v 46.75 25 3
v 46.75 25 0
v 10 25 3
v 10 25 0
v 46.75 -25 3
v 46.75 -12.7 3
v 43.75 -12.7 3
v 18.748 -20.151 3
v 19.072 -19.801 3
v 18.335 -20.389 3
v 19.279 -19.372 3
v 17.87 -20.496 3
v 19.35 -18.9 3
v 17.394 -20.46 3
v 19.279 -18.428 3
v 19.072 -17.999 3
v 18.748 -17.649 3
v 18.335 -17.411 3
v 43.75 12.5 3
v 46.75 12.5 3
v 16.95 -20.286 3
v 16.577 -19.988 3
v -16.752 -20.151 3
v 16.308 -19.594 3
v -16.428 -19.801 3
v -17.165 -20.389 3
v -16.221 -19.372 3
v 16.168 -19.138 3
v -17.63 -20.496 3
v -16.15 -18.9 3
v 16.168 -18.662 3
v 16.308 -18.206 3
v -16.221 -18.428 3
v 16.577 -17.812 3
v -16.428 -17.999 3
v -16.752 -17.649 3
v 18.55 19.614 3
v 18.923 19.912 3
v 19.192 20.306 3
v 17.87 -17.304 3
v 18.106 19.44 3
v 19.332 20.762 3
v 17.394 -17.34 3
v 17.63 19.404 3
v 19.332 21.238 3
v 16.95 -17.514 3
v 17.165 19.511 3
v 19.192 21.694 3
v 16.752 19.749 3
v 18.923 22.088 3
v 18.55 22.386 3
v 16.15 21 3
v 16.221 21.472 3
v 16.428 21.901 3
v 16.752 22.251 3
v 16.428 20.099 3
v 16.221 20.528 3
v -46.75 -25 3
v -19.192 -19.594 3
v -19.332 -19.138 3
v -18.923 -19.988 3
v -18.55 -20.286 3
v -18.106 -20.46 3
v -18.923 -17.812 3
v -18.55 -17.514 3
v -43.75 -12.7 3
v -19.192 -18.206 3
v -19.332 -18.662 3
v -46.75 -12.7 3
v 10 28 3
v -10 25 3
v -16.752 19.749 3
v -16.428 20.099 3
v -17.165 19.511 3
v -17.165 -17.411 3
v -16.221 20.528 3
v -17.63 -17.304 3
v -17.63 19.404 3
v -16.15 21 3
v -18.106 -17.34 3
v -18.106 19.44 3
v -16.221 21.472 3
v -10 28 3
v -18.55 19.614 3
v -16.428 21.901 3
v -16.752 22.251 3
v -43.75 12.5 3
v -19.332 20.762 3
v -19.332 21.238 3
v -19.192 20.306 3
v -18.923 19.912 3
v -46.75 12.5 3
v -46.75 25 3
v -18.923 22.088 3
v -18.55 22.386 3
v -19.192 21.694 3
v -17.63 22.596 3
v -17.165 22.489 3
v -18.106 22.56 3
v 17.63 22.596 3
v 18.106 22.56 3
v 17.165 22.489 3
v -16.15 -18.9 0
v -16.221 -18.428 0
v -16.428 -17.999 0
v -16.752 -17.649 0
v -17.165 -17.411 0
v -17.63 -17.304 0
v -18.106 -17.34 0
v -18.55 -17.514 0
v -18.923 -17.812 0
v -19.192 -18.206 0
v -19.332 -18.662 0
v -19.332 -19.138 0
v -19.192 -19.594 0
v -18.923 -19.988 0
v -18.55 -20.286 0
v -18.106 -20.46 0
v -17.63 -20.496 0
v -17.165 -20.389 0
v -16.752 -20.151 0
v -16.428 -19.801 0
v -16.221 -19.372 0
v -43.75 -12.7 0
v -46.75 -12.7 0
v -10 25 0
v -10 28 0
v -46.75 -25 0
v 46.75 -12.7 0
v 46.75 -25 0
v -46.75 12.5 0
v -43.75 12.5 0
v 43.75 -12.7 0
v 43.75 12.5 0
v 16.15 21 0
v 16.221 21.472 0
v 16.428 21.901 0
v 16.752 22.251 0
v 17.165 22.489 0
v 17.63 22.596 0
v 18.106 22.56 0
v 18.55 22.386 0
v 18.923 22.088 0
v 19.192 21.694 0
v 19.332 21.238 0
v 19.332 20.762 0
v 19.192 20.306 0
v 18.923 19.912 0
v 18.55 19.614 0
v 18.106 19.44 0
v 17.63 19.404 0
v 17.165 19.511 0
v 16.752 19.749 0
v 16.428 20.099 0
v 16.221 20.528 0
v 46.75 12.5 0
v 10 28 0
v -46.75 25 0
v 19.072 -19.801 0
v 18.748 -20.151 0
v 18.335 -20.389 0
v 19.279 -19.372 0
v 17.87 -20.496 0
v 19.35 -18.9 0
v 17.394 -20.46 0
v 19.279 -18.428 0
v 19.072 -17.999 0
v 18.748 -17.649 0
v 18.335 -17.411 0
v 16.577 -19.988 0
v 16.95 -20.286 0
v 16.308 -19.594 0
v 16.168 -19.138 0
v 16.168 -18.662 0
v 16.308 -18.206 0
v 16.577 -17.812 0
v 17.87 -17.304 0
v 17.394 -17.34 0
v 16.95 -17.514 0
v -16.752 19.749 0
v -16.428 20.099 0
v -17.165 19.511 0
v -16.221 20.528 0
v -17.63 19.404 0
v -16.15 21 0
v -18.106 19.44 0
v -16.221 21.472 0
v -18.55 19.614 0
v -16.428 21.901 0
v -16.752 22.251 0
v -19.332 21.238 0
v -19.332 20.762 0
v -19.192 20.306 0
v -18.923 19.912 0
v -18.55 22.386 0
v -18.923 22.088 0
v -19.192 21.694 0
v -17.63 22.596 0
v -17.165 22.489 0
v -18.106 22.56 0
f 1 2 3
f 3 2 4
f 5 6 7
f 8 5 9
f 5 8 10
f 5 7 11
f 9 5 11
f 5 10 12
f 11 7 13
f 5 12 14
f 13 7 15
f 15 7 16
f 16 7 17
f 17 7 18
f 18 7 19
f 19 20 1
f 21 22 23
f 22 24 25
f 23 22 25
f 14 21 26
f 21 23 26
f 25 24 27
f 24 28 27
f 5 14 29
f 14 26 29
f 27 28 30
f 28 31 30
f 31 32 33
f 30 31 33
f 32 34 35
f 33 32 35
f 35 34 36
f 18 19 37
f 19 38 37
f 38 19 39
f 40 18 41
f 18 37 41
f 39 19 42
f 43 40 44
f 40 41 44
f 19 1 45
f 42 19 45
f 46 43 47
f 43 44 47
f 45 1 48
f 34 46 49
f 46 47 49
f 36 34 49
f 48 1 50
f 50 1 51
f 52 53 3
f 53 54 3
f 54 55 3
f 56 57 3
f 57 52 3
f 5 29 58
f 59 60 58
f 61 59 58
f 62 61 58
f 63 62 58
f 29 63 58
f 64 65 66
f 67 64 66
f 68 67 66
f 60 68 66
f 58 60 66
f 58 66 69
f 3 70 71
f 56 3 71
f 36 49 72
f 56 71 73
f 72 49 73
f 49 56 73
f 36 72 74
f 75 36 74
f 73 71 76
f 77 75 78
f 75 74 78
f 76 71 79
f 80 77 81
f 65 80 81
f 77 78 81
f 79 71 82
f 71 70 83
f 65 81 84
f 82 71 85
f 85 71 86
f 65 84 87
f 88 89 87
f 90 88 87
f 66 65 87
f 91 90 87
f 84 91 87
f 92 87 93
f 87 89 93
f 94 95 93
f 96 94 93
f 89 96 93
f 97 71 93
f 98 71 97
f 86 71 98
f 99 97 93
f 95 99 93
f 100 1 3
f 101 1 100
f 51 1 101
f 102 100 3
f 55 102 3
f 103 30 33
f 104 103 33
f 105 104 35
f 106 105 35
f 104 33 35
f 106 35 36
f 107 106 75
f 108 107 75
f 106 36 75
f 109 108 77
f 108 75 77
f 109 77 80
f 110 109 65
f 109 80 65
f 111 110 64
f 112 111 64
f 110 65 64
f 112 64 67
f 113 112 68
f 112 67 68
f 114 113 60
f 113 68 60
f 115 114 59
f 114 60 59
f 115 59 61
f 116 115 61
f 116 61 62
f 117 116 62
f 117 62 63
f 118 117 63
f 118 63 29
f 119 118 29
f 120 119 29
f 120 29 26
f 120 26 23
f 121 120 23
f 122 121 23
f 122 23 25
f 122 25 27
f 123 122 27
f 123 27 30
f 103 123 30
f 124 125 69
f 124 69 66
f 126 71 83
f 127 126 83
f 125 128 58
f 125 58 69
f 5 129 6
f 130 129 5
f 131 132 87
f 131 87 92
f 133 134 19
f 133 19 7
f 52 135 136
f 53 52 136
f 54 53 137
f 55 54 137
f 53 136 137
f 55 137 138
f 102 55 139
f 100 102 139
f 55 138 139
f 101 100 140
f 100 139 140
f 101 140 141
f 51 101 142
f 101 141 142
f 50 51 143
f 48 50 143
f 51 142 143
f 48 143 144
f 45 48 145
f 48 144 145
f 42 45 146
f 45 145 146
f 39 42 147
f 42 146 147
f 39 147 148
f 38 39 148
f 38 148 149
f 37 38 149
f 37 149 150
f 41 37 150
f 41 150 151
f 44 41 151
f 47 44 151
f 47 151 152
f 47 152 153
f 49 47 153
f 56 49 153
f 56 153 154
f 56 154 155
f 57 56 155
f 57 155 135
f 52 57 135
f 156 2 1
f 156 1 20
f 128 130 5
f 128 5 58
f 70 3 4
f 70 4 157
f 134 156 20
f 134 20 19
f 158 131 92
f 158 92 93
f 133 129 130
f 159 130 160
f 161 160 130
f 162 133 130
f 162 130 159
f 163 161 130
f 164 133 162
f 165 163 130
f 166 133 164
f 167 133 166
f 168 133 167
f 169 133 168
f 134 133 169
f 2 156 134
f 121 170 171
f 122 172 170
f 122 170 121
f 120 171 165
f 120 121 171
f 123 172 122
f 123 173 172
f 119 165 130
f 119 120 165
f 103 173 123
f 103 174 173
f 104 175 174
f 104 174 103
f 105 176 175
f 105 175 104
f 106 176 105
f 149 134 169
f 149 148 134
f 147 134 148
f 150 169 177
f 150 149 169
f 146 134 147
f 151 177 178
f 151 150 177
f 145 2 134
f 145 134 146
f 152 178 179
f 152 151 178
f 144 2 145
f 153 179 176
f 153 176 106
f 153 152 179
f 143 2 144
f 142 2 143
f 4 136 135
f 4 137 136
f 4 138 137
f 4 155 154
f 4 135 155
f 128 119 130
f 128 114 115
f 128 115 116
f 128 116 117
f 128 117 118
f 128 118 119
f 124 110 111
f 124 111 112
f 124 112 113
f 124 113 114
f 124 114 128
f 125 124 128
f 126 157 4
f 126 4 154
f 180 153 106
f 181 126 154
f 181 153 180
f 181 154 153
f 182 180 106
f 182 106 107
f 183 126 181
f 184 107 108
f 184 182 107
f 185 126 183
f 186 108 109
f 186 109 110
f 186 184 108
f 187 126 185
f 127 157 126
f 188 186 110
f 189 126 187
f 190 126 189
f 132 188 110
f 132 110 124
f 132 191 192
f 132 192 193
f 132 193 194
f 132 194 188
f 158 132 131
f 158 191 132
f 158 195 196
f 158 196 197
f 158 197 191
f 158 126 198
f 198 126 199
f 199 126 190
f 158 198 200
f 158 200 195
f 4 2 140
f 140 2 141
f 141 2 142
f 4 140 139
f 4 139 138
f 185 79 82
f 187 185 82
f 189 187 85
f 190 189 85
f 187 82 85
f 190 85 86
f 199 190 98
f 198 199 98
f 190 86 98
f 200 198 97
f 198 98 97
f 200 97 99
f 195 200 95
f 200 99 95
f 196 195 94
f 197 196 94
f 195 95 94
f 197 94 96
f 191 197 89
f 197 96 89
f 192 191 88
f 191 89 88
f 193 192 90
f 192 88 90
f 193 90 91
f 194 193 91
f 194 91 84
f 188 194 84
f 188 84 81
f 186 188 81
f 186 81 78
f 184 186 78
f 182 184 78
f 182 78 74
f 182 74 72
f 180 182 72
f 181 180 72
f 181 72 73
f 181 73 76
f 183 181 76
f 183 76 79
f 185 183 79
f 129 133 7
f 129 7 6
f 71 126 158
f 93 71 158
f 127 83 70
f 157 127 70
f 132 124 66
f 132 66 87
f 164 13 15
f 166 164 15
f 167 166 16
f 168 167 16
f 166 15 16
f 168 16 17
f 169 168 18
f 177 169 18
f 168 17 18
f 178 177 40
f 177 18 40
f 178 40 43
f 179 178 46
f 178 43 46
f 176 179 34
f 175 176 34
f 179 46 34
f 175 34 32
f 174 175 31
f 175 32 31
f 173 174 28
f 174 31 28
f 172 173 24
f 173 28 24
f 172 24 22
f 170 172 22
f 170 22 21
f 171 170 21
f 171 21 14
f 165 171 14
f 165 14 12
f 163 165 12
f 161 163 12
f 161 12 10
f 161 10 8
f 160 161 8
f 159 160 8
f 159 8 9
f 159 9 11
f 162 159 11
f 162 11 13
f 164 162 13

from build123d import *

# Parameters (mm, degrees)
BOSS_EXTRU_1_DEPTH = 3
ESQUISSE2_W        = 20
ESQUISSE2_H        = 3
BOSS_EXTRU_2_DEPTH = 3
SKETCH1_R          = 1.6
CUT_EXTRUDE1_DEPTH = 55.576208186
SKETCH2_R          = 1.6
CUT_EXTRUDE2_DEPTH = 55.576208186
SKETCH3_R          = 1.6
CUT_EXTRUDE3_DEPTH = 55.576208186


with BuildPart() as part:
    # Esquisse1 → Boss.-Extru.1 (new body)
    with BuildSketch(Plane.XY):
        Polygon((46.75, -25), (-46.75, -25), (-46.75, -12.7), (-43.75, -12.7), (-43.75, 12.5), (-46.75, 12.5), (-46.75, 25), (-26.2, 25), (-23, 25), (23, 25), (26.2, 25), (46.75, 25), (46.75, 12.5), (43.75, 12.5), (43.75, -12.7), (46.75, -12.7), align=None)
    extrude(amount=BOSS_EXTRU_1_DEPTH)

    # Esquisse2 → Boss.-Extru.2 (add)
    with BuildSketch(Plane.XY.offset(3)):
        with Locations((0, 26.5)):
            Rectangle(ESQUISSE2_W, ESQUISSE2_H)
    extrude(amount=-BOSS_EXTRU_2_DEPTH)

    # Sketch1 → Cut-Extrude1 (cut, through all)
    with BuildSketch(Plane.XY.offset(3)):
        with Locations((-17.75, 21)):
            Circle(SKETCH1_R)
    extrude(amount=-CUT_EXTRUDE1_DEPTH, mode=Mode.SUBTRACT)

    # Sketch2 → Cut-Extrude2 (cut, through all)
    with BuildSketch(Plane(origin=(0, 0, 0), x_dir=(-1, 0, 0), z_dir=(0, 0, -1))):
        with Locations((-17.75, 21)):
            Circle(SKETCH2_R)
    extrude(amount=-CUT_EXTRUDE2_DEPTH, mode=Mode.SUBTRACT)

    # Sketch3 → Cut-Extrude3 (cut, through all)
    with BuildSketch(Plane.XY.offset(3)):
        with Locations((17.75, -18.9)):
            Circle(SKETCH3_R)
        with Locations((-17.75, -18.9)):
            Circle(SKETCH3_R)
    extrude(amount=-CUT_EXTRUDE3_DEPTH, mode=Mode.SUBTRACT)


solid = part.part
